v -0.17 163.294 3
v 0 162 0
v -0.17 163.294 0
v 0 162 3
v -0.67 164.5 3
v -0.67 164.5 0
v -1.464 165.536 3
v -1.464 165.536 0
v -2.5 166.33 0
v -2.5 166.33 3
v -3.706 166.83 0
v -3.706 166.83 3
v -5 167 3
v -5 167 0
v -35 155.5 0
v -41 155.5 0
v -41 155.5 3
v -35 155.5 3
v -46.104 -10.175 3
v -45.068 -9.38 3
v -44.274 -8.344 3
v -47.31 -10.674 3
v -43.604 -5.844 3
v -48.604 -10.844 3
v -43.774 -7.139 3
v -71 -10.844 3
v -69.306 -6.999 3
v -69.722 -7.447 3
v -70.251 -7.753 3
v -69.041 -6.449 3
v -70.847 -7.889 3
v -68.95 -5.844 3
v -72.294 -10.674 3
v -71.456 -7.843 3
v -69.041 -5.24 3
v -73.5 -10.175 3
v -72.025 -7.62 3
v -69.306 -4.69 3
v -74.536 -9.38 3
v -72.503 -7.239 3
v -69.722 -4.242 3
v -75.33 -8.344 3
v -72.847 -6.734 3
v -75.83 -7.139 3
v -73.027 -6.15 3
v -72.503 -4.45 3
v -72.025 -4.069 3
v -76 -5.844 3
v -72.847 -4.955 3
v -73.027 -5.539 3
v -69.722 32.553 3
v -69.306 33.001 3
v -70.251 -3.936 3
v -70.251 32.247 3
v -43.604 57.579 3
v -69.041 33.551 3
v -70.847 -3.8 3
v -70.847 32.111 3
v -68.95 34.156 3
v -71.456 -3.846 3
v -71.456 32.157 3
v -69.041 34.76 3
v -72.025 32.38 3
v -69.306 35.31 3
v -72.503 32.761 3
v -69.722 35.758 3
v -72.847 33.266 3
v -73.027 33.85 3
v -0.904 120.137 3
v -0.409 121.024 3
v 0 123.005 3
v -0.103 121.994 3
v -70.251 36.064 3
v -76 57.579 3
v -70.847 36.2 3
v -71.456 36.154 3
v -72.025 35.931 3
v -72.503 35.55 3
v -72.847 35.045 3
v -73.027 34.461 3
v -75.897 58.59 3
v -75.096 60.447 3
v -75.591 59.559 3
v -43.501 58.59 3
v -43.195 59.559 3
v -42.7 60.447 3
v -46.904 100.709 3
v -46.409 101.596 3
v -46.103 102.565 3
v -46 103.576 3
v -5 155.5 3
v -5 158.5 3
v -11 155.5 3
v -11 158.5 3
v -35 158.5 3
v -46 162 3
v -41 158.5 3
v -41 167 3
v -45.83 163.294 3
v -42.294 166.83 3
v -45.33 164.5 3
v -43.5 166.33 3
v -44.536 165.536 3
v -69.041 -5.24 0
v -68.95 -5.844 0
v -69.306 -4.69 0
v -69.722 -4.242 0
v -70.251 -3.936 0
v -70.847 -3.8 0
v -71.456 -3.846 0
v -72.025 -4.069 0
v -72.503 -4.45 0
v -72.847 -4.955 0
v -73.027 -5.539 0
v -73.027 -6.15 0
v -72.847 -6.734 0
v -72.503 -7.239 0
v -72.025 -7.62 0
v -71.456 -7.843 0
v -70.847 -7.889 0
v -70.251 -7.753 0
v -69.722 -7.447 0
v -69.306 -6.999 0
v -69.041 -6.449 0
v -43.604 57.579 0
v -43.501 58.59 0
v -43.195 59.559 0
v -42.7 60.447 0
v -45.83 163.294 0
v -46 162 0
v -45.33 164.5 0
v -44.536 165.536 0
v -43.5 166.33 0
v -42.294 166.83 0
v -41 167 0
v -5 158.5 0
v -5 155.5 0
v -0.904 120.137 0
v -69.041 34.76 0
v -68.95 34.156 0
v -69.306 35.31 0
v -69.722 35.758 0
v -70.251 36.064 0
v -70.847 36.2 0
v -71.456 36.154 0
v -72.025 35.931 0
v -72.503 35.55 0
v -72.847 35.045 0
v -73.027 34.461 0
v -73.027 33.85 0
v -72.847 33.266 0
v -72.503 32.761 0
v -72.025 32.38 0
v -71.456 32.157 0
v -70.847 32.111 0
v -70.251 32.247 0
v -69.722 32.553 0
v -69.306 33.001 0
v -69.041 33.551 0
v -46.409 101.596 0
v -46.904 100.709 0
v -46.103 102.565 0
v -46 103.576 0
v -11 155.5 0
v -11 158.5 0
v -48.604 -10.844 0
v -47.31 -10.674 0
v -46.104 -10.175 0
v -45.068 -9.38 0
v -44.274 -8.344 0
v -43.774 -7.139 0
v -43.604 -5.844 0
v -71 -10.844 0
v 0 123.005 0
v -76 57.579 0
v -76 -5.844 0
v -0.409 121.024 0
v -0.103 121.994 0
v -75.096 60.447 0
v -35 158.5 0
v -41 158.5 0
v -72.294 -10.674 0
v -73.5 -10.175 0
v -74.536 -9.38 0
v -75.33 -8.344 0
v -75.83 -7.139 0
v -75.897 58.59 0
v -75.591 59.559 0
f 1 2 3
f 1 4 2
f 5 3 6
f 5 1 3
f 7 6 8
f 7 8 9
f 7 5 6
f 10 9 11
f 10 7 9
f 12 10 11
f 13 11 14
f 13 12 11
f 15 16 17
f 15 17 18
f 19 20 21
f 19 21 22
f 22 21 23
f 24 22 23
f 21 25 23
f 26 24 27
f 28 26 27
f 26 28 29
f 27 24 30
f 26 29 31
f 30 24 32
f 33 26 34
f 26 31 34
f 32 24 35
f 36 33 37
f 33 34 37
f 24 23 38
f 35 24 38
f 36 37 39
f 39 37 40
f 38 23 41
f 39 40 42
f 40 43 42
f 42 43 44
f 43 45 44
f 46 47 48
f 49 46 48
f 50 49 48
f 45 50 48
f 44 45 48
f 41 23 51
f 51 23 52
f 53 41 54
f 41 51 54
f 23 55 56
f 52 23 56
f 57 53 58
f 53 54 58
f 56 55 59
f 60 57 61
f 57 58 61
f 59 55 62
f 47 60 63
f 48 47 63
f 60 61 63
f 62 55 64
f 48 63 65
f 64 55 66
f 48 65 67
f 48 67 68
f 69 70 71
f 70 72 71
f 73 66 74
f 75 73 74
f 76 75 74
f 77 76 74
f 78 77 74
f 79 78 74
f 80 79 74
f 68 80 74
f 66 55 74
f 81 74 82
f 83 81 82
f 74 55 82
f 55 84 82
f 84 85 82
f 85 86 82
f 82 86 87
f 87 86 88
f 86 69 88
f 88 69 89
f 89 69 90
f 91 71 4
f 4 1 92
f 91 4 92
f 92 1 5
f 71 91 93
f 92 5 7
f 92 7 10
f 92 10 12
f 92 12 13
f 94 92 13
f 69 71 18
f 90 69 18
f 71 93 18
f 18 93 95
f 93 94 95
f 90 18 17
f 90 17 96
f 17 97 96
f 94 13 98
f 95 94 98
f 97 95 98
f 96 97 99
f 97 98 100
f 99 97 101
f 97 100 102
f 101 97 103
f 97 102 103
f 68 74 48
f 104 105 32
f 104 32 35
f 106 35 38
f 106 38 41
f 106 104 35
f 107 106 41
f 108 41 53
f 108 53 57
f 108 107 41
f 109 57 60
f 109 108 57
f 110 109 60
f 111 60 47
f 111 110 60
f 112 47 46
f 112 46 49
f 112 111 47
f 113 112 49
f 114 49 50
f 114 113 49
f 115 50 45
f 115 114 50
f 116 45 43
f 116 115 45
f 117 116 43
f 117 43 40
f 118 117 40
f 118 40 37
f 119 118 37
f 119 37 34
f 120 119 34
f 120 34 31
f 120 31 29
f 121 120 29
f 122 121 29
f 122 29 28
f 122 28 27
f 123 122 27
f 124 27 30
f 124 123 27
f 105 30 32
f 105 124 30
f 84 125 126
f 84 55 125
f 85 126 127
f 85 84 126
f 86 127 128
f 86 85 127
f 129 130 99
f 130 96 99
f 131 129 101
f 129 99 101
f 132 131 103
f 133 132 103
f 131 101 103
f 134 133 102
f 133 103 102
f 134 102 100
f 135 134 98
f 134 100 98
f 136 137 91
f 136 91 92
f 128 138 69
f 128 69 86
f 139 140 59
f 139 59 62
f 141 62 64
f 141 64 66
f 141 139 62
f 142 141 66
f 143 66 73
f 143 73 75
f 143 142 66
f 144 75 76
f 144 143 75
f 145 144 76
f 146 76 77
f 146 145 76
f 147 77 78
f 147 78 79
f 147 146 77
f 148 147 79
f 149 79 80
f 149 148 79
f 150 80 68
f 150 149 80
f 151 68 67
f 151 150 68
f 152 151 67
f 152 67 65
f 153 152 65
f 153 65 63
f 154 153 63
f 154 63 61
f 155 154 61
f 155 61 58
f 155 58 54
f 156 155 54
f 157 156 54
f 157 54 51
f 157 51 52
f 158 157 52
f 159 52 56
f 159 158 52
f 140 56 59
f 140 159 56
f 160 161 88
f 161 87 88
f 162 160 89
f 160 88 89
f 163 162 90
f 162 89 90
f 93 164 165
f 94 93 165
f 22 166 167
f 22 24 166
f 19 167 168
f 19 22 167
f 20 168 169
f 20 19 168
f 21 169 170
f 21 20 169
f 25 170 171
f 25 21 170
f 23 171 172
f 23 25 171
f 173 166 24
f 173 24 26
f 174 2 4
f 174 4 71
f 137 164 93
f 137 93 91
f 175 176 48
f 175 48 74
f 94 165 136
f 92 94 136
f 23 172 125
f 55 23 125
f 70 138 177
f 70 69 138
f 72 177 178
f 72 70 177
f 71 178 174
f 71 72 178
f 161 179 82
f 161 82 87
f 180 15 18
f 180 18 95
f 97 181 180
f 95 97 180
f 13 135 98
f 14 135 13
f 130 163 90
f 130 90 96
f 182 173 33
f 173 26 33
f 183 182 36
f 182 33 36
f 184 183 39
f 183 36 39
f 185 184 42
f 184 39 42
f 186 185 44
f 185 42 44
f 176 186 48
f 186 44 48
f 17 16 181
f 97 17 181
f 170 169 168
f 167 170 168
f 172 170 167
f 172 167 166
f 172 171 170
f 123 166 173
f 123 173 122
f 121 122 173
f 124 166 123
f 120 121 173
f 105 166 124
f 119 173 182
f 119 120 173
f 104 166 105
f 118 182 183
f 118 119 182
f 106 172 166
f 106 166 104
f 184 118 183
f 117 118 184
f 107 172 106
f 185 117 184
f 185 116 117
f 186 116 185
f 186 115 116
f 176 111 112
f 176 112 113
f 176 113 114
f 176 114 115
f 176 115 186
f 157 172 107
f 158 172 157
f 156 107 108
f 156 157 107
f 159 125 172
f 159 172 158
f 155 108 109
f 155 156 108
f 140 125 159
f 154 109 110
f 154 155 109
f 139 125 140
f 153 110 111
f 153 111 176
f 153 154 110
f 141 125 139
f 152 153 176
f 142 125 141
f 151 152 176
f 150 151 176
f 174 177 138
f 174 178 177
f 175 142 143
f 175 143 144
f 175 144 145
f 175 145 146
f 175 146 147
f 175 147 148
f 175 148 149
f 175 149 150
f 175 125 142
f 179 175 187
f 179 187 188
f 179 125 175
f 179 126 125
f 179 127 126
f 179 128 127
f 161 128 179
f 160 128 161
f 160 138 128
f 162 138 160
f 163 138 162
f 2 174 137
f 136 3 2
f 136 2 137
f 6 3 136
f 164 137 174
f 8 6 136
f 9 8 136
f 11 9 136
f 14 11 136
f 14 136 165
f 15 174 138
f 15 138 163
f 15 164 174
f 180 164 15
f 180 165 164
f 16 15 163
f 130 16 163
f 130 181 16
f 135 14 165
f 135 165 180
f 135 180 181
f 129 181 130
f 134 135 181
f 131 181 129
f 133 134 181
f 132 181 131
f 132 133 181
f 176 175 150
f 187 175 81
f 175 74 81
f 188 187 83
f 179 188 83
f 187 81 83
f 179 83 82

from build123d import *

# Parameters (mm, degrees)
SKETCH1_R           = 2.05
SKETCH1_W           = 6
SKETCH1_H           = 3
BOSS_EXTRUDE1_DEPTH = 3
FILLET1_R           = 5


with BuildPart() as part:
    # Sketch1 → Boss-Extrude1 (new body)
    with BuildSketch(Plane.XY):
        Polygon((-43.603832711, -10.844440202), (-76, -10.844440202), (-76, 59.155559798), (-46, 102), (-46, 167), (0, 167), (0, 121.42828657), (-43.603832711, 59.155559798), (-43.603832711, 39.727273228), align=None)
        with Locations((-71, 34.155559798)):
            Circle(SKETCH1_R, mode=Mode.SUBTRACT)
        with Locations((-71, -5.844440202)):
            Circle(SKETCH1_R, mode=Mode.SUBTRACT)
        with Locations((-38, 157)):
            Rectangle(SKETCH1_W, SKETCH1_H, mode=Mode.SUBTRACT)
        with Locations((-8, 157)):
            Rectangle(SKETCH1_W, SKETCH1_H, mode=Mode.SUBTRACT)
    extrude(amount=BOSS_EXTRUDE1_DEPTH)

    # Fillet1
    fillet1_edges = [part.edges().sort_by_distance(p)[0] for p in [
        (-43.603832711, 59.155559798, 1.5),
        (-43.603832711, -10.844440202, 1.5),
        (-76, -10.844440202, 1.5),
        (-76, 59.155559798, 1.5),
        (-46, 102, 1.5),
        (-46, 167, 1.5),
        (0, 167, 1.5),
        (0, 121.42828657, 1.5),
    ]]
    fillet(fillet1_edges, radius=FILLET1_R)


solid = part.part
